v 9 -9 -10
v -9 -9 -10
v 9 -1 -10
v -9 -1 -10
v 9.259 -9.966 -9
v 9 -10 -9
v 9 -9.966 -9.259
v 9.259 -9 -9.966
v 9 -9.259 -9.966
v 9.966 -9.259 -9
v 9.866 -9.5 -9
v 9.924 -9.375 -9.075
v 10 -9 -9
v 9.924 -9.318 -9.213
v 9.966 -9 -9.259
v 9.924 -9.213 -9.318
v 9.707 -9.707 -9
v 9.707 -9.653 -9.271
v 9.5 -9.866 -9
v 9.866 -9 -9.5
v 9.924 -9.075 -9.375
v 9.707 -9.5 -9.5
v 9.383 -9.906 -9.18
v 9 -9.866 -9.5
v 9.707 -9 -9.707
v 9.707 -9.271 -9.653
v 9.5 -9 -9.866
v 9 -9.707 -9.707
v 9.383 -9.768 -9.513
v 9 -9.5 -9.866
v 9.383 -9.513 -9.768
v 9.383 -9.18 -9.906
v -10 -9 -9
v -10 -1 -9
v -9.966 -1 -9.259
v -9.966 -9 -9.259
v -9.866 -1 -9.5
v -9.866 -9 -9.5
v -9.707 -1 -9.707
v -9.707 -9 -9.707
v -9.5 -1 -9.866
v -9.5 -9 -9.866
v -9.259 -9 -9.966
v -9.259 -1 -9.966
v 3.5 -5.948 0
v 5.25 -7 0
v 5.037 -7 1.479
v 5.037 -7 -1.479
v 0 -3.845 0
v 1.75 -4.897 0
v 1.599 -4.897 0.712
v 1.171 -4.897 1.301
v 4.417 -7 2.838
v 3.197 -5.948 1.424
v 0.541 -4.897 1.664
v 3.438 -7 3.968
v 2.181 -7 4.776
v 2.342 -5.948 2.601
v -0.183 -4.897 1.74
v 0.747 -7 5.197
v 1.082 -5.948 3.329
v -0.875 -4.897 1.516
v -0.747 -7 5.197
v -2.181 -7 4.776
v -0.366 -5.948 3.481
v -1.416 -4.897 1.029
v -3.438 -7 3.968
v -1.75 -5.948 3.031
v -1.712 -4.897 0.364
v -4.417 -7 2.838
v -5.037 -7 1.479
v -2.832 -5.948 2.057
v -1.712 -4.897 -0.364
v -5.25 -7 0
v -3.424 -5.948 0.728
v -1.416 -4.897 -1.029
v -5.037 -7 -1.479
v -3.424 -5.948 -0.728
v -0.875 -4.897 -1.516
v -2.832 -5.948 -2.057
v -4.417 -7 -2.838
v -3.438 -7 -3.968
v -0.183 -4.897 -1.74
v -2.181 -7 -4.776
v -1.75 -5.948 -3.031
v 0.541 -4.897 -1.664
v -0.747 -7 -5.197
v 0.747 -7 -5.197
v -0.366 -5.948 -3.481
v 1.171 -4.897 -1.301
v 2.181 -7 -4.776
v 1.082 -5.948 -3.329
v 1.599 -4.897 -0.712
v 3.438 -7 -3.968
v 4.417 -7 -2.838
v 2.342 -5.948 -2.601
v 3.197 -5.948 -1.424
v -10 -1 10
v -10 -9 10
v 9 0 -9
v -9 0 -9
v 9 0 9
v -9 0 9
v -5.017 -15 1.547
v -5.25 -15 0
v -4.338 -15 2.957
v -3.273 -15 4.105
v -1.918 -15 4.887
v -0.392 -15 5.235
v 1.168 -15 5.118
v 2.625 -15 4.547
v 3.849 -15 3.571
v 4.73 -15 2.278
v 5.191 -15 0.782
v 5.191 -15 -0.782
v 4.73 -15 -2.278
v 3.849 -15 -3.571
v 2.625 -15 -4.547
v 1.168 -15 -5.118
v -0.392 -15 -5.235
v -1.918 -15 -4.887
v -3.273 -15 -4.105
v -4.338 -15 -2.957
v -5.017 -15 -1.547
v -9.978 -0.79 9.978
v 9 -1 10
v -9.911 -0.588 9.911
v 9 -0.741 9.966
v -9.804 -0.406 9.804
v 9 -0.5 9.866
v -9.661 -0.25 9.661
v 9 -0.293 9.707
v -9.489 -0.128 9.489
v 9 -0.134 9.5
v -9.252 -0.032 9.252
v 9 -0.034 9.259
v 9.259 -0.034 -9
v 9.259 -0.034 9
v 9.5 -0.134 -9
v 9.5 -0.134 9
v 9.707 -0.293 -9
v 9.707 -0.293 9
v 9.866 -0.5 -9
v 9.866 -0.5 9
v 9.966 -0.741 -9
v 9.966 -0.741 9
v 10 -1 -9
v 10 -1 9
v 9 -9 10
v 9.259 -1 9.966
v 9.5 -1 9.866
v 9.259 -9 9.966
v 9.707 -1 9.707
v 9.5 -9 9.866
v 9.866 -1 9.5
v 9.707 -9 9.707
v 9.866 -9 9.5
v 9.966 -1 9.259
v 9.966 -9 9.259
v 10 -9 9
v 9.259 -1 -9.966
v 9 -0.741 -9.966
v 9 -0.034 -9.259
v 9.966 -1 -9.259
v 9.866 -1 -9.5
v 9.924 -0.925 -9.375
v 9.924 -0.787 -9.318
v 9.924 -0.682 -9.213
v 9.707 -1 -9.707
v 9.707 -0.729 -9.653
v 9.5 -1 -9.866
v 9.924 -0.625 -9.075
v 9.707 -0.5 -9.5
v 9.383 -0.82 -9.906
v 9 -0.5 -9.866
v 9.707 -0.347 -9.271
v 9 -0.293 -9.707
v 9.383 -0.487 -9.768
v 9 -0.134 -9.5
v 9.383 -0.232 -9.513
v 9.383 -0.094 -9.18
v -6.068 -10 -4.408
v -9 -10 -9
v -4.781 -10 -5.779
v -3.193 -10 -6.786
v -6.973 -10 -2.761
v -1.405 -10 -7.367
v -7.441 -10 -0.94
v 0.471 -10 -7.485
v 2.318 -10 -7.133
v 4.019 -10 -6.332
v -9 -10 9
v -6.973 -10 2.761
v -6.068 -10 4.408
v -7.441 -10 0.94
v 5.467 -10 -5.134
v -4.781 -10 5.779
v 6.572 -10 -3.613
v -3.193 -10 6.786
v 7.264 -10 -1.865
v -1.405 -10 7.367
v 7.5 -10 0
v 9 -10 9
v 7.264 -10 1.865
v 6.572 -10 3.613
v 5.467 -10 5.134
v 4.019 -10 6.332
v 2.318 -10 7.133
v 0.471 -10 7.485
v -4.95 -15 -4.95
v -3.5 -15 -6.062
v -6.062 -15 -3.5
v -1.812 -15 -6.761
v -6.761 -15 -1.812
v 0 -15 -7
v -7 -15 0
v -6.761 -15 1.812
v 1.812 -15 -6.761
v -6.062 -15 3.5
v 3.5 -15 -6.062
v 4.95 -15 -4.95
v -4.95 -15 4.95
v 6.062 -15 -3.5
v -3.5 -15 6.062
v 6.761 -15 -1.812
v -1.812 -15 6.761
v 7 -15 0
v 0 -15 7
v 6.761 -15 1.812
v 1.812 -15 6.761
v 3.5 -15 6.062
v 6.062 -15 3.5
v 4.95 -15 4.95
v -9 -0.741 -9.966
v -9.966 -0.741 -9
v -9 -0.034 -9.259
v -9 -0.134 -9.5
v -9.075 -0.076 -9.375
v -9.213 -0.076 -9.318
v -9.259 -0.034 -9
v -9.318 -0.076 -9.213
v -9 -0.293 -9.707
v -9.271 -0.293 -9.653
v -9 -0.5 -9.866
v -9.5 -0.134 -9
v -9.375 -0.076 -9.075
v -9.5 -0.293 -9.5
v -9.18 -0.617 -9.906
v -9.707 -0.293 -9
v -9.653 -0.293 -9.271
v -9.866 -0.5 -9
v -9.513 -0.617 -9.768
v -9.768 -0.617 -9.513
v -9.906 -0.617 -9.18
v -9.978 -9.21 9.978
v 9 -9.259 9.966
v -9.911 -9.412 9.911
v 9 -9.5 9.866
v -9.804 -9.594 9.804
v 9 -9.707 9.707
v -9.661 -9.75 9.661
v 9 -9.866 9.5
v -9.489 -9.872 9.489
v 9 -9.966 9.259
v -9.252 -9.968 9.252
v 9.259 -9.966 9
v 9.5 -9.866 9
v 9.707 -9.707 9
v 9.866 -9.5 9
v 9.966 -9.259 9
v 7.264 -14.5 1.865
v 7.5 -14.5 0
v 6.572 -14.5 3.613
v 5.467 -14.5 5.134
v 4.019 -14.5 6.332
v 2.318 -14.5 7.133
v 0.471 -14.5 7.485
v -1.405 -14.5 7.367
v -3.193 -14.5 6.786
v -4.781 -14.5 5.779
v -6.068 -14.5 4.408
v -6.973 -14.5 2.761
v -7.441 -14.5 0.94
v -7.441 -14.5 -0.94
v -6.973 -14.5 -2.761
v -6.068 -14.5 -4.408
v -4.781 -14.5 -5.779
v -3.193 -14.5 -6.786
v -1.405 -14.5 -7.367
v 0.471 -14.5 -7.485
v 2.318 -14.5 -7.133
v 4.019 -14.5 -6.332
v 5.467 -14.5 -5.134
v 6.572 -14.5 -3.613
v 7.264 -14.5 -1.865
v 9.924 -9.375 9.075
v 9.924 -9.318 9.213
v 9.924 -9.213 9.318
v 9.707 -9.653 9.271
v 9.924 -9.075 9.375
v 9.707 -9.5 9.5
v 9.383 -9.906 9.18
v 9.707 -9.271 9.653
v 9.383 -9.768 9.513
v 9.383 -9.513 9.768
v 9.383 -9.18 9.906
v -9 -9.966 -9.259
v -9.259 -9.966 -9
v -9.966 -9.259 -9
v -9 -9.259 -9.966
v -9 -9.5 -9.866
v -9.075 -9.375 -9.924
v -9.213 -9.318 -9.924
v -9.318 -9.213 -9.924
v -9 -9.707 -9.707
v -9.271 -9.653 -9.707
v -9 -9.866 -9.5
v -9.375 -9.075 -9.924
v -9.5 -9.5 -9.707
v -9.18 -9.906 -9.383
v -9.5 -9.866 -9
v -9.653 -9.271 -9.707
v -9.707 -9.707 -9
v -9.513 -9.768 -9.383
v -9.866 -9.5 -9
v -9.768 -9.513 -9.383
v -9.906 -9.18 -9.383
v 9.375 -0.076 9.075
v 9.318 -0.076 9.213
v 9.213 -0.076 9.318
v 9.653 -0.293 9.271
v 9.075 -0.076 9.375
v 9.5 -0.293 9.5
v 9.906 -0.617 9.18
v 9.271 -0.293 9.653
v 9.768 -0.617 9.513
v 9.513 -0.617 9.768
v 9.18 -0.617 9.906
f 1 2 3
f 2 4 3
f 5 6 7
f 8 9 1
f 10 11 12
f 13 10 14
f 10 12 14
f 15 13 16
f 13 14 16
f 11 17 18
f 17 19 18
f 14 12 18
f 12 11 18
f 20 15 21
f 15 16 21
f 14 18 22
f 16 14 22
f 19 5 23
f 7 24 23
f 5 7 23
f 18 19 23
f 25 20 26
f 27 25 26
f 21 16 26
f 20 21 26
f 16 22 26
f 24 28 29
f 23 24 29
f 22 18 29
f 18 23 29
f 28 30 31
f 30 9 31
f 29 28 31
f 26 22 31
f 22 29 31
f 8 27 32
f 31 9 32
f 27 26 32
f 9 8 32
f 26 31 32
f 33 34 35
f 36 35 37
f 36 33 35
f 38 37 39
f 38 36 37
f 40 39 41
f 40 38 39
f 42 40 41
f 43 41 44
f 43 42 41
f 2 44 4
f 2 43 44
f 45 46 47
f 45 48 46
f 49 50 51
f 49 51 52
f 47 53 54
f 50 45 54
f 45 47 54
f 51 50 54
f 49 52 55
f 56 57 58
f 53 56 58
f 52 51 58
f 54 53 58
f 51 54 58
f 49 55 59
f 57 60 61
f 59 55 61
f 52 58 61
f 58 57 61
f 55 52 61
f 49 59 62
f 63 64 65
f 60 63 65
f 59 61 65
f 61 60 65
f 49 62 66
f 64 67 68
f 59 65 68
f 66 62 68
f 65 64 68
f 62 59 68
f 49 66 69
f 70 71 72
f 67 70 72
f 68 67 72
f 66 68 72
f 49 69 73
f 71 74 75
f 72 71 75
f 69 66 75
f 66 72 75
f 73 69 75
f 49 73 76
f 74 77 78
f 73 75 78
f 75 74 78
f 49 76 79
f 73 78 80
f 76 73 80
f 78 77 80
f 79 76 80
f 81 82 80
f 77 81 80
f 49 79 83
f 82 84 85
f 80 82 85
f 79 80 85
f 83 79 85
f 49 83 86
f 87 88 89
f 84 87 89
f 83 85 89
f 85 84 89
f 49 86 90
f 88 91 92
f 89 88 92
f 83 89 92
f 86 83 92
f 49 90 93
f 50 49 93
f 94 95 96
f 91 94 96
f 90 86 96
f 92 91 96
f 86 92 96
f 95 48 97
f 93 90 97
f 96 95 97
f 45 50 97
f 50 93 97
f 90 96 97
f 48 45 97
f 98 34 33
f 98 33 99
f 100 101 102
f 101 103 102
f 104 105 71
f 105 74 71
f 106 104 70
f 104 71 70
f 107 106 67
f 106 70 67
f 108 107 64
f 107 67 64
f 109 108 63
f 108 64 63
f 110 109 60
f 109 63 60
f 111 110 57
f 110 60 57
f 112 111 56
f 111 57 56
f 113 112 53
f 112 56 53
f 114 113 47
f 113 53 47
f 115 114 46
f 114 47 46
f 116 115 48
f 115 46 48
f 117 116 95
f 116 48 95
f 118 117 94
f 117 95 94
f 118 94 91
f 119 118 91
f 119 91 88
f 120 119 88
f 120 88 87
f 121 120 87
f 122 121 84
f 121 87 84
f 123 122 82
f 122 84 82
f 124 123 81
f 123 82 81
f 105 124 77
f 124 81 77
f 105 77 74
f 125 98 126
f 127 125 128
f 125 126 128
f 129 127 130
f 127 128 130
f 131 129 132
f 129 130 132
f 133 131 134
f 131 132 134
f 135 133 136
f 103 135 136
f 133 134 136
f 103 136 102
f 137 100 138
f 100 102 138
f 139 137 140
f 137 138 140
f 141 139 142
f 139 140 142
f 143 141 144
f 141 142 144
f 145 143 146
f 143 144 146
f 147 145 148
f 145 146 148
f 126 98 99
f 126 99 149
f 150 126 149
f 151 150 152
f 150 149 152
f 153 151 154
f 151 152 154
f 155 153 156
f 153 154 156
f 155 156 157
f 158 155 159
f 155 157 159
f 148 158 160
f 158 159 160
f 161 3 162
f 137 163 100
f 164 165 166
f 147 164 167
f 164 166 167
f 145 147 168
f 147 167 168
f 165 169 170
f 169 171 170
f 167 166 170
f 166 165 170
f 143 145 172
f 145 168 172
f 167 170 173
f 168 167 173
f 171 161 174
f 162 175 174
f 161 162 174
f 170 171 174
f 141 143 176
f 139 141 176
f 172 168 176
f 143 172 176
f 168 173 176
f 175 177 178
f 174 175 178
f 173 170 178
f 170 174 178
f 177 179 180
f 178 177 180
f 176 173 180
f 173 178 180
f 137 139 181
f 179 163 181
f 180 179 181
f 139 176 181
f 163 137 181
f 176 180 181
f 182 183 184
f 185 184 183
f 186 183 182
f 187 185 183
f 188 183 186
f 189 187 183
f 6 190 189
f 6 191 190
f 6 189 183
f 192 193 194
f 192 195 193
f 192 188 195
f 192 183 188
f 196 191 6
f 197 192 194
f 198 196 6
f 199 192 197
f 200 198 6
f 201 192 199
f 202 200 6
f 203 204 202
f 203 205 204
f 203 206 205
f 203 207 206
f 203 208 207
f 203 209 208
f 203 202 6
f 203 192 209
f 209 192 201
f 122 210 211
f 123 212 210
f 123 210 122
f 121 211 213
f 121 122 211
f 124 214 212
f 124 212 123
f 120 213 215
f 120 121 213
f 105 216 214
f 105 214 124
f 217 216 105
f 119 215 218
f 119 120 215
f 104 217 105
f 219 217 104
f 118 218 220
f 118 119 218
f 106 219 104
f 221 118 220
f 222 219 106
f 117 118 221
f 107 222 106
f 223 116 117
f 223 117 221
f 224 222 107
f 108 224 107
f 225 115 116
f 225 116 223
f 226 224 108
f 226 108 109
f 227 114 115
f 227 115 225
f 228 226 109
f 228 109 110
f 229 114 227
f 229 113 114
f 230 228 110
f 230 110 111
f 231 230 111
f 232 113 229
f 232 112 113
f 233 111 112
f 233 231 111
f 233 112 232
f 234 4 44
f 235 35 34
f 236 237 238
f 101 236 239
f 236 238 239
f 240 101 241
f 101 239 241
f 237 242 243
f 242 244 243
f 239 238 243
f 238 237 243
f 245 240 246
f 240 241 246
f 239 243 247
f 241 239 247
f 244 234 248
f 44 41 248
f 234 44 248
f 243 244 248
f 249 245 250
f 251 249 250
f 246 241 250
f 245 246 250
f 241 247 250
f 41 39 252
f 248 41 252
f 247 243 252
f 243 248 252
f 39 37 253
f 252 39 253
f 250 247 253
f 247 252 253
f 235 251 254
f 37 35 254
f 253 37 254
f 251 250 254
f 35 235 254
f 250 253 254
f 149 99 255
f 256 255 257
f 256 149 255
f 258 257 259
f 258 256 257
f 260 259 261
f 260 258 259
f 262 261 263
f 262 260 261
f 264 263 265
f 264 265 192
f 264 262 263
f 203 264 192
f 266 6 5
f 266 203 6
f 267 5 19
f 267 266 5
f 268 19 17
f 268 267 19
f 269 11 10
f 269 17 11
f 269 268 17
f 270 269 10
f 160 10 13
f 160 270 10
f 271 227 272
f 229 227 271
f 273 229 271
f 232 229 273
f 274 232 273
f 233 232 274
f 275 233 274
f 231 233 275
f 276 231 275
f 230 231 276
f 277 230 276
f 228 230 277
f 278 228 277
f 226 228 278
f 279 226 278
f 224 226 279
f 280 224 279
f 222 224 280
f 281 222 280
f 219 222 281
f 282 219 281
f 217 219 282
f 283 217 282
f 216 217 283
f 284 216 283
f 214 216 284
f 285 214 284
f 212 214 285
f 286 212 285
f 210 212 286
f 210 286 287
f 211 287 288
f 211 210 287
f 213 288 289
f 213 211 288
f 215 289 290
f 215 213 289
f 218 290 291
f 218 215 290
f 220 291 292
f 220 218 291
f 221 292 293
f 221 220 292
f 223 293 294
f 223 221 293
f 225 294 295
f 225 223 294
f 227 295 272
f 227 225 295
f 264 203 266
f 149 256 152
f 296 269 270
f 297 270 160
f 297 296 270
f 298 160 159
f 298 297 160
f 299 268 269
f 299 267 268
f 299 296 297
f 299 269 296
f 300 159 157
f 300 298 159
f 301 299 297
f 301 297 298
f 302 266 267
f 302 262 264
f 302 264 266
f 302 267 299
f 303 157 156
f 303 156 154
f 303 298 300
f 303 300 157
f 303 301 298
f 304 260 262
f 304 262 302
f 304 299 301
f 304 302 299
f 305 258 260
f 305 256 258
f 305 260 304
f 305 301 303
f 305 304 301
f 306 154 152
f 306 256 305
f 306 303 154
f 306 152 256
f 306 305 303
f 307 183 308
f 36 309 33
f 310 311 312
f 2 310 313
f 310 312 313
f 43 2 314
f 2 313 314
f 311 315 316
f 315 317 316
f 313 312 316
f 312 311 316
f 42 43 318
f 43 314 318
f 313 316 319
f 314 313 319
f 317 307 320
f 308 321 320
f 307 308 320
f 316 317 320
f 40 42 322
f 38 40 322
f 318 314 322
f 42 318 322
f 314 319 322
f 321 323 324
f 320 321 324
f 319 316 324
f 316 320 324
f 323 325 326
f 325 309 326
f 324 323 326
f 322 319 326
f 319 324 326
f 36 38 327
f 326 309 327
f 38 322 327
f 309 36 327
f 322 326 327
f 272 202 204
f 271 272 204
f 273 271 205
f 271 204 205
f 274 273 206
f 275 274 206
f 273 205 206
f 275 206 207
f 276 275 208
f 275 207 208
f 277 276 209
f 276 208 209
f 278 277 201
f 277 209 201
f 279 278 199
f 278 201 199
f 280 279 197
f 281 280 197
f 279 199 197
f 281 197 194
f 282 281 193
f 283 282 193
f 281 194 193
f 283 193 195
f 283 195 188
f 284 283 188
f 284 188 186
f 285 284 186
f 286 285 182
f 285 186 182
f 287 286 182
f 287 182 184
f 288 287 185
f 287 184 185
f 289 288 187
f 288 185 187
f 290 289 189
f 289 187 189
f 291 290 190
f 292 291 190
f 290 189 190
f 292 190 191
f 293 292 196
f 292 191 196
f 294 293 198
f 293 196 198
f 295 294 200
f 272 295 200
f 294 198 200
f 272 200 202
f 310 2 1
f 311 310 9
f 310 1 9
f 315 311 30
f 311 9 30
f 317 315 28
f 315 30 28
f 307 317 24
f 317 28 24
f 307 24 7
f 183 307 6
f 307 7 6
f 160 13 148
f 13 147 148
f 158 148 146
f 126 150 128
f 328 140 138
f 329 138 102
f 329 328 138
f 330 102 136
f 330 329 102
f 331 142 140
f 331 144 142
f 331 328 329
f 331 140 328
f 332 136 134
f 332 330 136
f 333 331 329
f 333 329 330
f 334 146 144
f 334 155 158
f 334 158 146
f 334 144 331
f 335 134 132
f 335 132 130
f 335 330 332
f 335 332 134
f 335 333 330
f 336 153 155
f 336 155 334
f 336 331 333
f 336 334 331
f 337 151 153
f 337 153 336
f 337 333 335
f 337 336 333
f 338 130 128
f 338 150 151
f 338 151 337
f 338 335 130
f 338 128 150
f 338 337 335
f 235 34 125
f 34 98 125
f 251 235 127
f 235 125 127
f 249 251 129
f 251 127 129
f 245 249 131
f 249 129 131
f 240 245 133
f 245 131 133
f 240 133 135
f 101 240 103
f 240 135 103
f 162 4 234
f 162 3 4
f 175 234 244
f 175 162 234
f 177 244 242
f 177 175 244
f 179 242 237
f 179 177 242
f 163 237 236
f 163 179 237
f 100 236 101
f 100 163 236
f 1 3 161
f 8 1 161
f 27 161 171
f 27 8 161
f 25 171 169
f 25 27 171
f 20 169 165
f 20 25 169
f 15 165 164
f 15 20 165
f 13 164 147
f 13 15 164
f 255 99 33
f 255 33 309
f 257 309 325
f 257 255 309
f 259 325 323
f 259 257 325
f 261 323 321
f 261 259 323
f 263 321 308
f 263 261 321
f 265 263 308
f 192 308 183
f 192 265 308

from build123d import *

# Parameters (mm, degrees)
F0_W     = 20
F0_H     = 20
F1_DEPTH = 10
F2_R     = 7.5
F3_DEPTH = 5
F5_D     = 10.5
F5_DEPTH = 8
F5_TIP   = 3.1545182499
F6_R     = 1
F7_SIZE  = 0.5


with BuildPart() as f1:
    # F0 (on Front) → F1 (new body)
    with BuildSketch(Plane.XZ):
        Rectangle(F0_W, F0_H)
    extrude(amount=F1_DEPTH)

    # F2 (on face) → F3 (join)
    with BuildSketch(Plane.XZ.offset(10)):
        Circle(F2_R)
    extrude(amount=F3_DEPTH)

    # F5
    with Locations(Plane.XZ.offset(15)):
        with Locations((0, 0)):
            Hole(F5_D / 2, depth=F5_DEPTH)
            with Locations((0, 0, -(F5_DEPTH + F5_TIP / 2))):  # 118° drill point
                Cone(0, F5_D / 2, F5_TIP, mode=Mode.SUBTRACT)

    # F6
    f6_edges = [f1.edges().sort_by_distance(p)[0] for p in [
        (0, -10, 10),
        (-10, -10, 0),
        (0, -10, -10),
        (10, -10, 0),
        (-10, -5, -10),
        (0, 0, -10),
        (10, -5, -10),
        (10, -5, 10),
        (10, 0, 0),
        (-10, 0, 0),
        (0, 0, 10),
    ]]
    fillet(f6_edges, radius=F6_R)

    # F7
    f7_edges = [f1.edges().sort_by_distance(p)[0] for p in [
        (-7.5, -15, 0),
    ]]
    chamfer(f7_edges, length=F7_SIZE)


solid = f1.part
